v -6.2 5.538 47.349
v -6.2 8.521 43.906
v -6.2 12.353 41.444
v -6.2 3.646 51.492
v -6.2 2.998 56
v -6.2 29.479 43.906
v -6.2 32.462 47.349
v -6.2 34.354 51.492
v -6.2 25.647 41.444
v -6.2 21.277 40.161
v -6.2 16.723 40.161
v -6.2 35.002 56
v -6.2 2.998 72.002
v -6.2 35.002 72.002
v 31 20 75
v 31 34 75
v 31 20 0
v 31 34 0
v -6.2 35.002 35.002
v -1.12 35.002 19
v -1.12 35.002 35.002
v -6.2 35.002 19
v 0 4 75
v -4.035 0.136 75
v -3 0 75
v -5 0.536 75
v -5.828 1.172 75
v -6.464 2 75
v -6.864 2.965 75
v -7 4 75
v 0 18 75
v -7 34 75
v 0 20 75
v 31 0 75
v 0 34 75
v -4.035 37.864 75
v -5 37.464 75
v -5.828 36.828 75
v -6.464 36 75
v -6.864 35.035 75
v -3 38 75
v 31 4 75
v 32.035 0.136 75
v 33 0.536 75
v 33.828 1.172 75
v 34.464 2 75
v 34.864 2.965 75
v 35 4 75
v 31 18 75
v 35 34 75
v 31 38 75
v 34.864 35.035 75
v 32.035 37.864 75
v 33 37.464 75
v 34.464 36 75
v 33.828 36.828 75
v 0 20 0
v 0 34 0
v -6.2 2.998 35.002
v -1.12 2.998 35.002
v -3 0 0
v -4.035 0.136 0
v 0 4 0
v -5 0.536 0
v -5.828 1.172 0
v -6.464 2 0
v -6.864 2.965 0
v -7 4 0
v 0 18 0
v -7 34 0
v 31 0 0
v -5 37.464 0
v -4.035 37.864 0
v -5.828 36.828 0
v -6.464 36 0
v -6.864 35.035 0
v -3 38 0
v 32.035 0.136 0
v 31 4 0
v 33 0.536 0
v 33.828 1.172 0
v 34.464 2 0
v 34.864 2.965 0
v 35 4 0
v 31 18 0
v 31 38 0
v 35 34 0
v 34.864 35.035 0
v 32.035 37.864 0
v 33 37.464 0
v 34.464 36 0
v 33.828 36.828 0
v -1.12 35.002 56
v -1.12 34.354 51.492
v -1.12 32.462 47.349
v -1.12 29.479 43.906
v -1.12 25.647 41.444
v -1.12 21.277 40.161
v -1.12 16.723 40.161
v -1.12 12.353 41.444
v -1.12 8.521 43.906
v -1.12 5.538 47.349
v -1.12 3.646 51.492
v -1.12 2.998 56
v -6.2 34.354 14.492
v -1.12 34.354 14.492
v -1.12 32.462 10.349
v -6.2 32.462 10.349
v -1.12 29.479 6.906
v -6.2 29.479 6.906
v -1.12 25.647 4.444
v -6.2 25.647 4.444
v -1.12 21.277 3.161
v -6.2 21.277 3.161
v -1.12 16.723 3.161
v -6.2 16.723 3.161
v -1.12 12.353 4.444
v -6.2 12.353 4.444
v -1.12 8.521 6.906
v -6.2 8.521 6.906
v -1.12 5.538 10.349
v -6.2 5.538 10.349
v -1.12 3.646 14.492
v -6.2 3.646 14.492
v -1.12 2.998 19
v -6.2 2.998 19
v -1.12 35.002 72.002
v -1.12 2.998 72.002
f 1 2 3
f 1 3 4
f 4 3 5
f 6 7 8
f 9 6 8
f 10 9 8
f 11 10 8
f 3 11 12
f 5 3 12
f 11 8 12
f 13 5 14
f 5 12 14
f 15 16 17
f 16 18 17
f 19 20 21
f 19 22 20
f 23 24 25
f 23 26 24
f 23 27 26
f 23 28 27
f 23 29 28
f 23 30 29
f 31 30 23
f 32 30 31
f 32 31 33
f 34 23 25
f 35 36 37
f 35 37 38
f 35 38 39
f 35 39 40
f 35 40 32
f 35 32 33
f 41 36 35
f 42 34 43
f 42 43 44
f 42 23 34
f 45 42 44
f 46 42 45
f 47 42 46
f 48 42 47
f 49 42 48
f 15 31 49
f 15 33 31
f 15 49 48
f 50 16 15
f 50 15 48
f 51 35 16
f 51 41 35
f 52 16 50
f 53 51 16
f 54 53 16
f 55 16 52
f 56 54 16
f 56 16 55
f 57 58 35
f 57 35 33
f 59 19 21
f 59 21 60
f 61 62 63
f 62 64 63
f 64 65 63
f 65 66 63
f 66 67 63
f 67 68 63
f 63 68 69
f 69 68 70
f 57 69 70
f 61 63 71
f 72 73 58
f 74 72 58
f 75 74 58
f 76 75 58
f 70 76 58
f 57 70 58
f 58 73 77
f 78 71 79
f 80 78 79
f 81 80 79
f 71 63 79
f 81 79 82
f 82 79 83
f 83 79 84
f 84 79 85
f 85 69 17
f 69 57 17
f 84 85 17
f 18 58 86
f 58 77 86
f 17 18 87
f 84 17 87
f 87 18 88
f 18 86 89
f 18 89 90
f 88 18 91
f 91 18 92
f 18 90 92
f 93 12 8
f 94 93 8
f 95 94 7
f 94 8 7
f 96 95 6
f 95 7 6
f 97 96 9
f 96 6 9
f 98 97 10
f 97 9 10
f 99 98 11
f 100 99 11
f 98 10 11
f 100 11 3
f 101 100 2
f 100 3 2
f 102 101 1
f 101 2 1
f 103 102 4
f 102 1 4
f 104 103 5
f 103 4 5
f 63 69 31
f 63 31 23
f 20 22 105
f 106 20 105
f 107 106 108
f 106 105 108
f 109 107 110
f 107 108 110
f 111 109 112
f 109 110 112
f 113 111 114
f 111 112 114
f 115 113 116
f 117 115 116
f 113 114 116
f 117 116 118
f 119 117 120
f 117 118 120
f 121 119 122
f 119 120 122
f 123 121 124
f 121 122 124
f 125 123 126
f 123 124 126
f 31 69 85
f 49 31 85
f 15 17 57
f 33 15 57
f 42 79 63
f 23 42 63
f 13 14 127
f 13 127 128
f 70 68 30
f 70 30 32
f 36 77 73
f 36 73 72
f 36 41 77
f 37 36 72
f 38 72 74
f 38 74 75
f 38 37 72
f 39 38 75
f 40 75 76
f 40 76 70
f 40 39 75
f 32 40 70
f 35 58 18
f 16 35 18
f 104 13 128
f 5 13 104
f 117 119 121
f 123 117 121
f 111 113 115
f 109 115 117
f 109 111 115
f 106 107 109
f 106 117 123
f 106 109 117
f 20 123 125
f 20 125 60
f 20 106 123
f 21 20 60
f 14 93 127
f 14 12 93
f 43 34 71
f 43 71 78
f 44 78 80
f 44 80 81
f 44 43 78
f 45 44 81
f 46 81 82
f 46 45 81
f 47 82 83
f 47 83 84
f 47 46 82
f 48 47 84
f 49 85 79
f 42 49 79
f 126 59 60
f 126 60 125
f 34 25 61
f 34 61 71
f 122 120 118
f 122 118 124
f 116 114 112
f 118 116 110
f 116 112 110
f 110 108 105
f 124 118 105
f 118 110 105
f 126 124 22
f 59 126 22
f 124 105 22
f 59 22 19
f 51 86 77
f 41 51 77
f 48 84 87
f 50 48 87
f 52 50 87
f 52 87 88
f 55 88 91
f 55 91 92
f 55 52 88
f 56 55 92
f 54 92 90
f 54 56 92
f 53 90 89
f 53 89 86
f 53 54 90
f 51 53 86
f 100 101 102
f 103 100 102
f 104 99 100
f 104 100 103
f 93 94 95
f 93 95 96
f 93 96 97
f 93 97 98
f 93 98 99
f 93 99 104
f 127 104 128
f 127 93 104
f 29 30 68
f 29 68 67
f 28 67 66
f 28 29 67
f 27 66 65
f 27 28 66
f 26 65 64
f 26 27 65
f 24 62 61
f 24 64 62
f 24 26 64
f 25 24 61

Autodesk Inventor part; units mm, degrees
ref_plane "YZ Plane" through (0, 0, 0) normal (1, 0, 0) x (0, 1, 0)
ref_plane "XZ Plane" through (0, 0, 0) normal (0, 1, 0) x (-1, 0, 0)
sketch "Sketch1" plane through (0, 0, 0) normal (0, 0, 1) x (1, 0, 0)
  line L0 (0, 0) -> (31, 0)
  line L1 (31, 0) -> (31, 4)
  line L2 (31, 4) -> (0, 4)
  line L3 (0, 4) -> (0, 0)
  line L4 (0, 18) -> (31, 18)
  line L5 (31, 18) -> (31, 20)
  line L6 (31, 20) -> (0, 20)
  line L7 (0, 20) -> (0, 18)
  line L8 (0, 34) -> (31, 34)
  line L9 (31, 34) -> (31, 38)
  line L10 (31, 38) -> (0, 38)
  line L11 (0, 38) -> (0, 34)
  line L12 (-7, 38) -> (0, 38)
  line L13 (0, 38) -> (0, 0)
  line L14 (0, 0) -> (-7, 0)
  line L15 (-7, 0) -> (-7, 38)
  line L16 (35, 38) -> (31, 38)
  line L17 (31, 38) -> (31, 0)
  line L18 (31, 0) -> (35, 0)
  line L19 (35, 0) -> (35, 38)
  point P0 (0, 4)
  point P1 (0, 18)
  point P2 (0, 20)
  point P3 (0, 34)
  dimension "d1" = 31
  dimension "d3" = 14
  dimension "d4" = 14
  dimension "d7" = 4
  dimension "d25" = 2
  dimension "d26" = 7
  dimension "d27" = 4
extrude "Extrusion1" add sketch "Sketch1" along normal blind 75 contours L3 L2 L1 L0 | L14 L15 L12 L11 L13 L7 L3 | L1 L17 L5 L9 L16 L19 L18 | L7 L6 L5 L4 | L10 L9 L8 L11
ref_plane "Work Plane5" through (-6.2, 0, 0) normal (-1, 0, 0) x (0, 0, 1)
sketch "Sketch4" plane through (-7, 0, 0) normal (-1, 0, 0) x (0, 0, 1)
  circle A0 centre (19, 19) radius 16.002
  circle A1 centre (56, 19) radius 16.002
  line L0 (75, 38) -> (75, 0) projected
  line L1 (0, 38) -> (0, 0) projected
  line L2 (56, 35.002) -> (72.002, 35.002)
  line L3 (72.002, 35.002) -> (72.002, 2.998)
  line L4 (72.002, 2.998) -> (56, 2.998)
  line L5 (19, 35.002) -> (35.002, 35.002)
  line L6 (35.002, 35.002) -> (35.002, 2.998)
  line L7 (35.002, 2.998) -> (19, 2.998)
  point P0 (0, 19)
  point P1 (35.002, 19)
  point P2 (72.002, 19)
  dimension "d28" = 32.004
  dimension "d29" = 32.004
  dimension "d32" = 19
  dimension "d33" = 19
extrude "Extrusion4" cut sketch "Sketch4" against normal blind 5.08 from surface at -0.8
fillet "Fillet2" radius 4 4 edges at (-7, 38, 37.5) (35, 38, 37.5) (35, 0, 37.5) (-7, 0, 37.5)
equation "\"d3\" = d4"
properties part number "Electronics Mount"
